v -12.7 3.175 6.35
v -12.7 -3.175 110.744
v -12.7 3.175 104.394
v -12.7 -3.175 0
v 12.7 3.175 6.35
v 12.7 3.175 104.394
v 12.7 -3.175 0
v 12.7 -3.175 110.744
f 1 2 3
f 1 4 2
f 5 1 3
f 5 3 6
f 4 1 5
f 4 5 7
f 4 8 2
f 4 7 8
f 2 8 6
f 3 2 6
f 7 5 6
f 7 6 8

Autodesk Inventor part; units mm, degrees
ref_plane "Start plane" through (0, 0, 0) normal (0, 0, 1) x (1, 0, 0)
ref_plane "End plane" through (0, 0, 110.744) normal (0, 0, 1) x (1, 0, 0)
sketch "Sketch" plane through (0, 0, 0) normal (0, 0, 1) x (1, 0, 0)
  line L0 (12.7, -3.175) -> (-12.7, -3.175)
  line L1 (-12.7, -3.175) -> (-12.7, 3.175)
  line L2 (-12.7, 3.175) -> (12.7, 3.175)
  line L3 (12.7, 3.175) -> (12.7, -3.175)
  line L4 (-6, 0) -> (8, 0) construction
  line L5 (0, -30) -> (0, 40) construction
  line L6 (0, 54) -> (0, -44) construction
  line L7 (-17.78, 0) -> (17.78, 0) construction
  dimension "d0" = 6.35
  dimension "d1" = 25.4
  dimension "d4" = 12.7
  dimension "d5" = 3.175
extrude "Body" add sketch "Sketch" along normal up to surface (110.744 mm away) from surface at 0
sketch "Sketch3" plane through (0, 0, 0) normal (0, 0, 1) x (1, 0, 0)
  line L0 (0, 0) -> (10, 0)
ref_plane "Work Plane3" through (0, 0, 0) normal (0, -1, 0) x (1, 0, 0)
sketch "Sketch4" plane through (0, 0, 0) normal (0, -1, 0) x (1, 0, 0)
  line L0 (-2, 0) -> (12, 0)
  line L1 (-2, 110.744) -> (12, 110.744)
  dimension "d9" = 110.744
ref_plane "Work Plane4" through (0, -22.225, -19.05) normal (0, 0.7071, -0.7071) x (1, 0, 0)
split "Split1" plane through (0, -22.225, -19.05) removes the side toward (0, 0.7071, -0.7071)
ref_plane "Work Plane5" through (0, -3.175, 110.744) normal (0, 0.7071, 0.7071) x (1, 0, 0)
split "Split2" plane through (0, -3.175, 110.744) removes the side toward (0, 0.7071, 0.7071)
equation "\"d0\" = G_W"
equation "\"d1\" = G_H"
equation "\"d4\" = 0.5 * d1"
equation "\"d5\" = 0.5 * d0"
equation "\"d2\" = G_L"
equation "\"G_W\" = 6.35"
equation "\"G_H\" = 25.4"
equation "\"G_L\" = d9"
equation "\"G_OFFSET_START\" = 0"
equation "\"G_OFFSET_END\" = 0"
equation "\"d7\" = G_OFFSET_END + B_L"
equation "\"B_L\" = 110.744"
properties part number "AISC - 1/4x1 - 4.36" material "Steel, Mild"
